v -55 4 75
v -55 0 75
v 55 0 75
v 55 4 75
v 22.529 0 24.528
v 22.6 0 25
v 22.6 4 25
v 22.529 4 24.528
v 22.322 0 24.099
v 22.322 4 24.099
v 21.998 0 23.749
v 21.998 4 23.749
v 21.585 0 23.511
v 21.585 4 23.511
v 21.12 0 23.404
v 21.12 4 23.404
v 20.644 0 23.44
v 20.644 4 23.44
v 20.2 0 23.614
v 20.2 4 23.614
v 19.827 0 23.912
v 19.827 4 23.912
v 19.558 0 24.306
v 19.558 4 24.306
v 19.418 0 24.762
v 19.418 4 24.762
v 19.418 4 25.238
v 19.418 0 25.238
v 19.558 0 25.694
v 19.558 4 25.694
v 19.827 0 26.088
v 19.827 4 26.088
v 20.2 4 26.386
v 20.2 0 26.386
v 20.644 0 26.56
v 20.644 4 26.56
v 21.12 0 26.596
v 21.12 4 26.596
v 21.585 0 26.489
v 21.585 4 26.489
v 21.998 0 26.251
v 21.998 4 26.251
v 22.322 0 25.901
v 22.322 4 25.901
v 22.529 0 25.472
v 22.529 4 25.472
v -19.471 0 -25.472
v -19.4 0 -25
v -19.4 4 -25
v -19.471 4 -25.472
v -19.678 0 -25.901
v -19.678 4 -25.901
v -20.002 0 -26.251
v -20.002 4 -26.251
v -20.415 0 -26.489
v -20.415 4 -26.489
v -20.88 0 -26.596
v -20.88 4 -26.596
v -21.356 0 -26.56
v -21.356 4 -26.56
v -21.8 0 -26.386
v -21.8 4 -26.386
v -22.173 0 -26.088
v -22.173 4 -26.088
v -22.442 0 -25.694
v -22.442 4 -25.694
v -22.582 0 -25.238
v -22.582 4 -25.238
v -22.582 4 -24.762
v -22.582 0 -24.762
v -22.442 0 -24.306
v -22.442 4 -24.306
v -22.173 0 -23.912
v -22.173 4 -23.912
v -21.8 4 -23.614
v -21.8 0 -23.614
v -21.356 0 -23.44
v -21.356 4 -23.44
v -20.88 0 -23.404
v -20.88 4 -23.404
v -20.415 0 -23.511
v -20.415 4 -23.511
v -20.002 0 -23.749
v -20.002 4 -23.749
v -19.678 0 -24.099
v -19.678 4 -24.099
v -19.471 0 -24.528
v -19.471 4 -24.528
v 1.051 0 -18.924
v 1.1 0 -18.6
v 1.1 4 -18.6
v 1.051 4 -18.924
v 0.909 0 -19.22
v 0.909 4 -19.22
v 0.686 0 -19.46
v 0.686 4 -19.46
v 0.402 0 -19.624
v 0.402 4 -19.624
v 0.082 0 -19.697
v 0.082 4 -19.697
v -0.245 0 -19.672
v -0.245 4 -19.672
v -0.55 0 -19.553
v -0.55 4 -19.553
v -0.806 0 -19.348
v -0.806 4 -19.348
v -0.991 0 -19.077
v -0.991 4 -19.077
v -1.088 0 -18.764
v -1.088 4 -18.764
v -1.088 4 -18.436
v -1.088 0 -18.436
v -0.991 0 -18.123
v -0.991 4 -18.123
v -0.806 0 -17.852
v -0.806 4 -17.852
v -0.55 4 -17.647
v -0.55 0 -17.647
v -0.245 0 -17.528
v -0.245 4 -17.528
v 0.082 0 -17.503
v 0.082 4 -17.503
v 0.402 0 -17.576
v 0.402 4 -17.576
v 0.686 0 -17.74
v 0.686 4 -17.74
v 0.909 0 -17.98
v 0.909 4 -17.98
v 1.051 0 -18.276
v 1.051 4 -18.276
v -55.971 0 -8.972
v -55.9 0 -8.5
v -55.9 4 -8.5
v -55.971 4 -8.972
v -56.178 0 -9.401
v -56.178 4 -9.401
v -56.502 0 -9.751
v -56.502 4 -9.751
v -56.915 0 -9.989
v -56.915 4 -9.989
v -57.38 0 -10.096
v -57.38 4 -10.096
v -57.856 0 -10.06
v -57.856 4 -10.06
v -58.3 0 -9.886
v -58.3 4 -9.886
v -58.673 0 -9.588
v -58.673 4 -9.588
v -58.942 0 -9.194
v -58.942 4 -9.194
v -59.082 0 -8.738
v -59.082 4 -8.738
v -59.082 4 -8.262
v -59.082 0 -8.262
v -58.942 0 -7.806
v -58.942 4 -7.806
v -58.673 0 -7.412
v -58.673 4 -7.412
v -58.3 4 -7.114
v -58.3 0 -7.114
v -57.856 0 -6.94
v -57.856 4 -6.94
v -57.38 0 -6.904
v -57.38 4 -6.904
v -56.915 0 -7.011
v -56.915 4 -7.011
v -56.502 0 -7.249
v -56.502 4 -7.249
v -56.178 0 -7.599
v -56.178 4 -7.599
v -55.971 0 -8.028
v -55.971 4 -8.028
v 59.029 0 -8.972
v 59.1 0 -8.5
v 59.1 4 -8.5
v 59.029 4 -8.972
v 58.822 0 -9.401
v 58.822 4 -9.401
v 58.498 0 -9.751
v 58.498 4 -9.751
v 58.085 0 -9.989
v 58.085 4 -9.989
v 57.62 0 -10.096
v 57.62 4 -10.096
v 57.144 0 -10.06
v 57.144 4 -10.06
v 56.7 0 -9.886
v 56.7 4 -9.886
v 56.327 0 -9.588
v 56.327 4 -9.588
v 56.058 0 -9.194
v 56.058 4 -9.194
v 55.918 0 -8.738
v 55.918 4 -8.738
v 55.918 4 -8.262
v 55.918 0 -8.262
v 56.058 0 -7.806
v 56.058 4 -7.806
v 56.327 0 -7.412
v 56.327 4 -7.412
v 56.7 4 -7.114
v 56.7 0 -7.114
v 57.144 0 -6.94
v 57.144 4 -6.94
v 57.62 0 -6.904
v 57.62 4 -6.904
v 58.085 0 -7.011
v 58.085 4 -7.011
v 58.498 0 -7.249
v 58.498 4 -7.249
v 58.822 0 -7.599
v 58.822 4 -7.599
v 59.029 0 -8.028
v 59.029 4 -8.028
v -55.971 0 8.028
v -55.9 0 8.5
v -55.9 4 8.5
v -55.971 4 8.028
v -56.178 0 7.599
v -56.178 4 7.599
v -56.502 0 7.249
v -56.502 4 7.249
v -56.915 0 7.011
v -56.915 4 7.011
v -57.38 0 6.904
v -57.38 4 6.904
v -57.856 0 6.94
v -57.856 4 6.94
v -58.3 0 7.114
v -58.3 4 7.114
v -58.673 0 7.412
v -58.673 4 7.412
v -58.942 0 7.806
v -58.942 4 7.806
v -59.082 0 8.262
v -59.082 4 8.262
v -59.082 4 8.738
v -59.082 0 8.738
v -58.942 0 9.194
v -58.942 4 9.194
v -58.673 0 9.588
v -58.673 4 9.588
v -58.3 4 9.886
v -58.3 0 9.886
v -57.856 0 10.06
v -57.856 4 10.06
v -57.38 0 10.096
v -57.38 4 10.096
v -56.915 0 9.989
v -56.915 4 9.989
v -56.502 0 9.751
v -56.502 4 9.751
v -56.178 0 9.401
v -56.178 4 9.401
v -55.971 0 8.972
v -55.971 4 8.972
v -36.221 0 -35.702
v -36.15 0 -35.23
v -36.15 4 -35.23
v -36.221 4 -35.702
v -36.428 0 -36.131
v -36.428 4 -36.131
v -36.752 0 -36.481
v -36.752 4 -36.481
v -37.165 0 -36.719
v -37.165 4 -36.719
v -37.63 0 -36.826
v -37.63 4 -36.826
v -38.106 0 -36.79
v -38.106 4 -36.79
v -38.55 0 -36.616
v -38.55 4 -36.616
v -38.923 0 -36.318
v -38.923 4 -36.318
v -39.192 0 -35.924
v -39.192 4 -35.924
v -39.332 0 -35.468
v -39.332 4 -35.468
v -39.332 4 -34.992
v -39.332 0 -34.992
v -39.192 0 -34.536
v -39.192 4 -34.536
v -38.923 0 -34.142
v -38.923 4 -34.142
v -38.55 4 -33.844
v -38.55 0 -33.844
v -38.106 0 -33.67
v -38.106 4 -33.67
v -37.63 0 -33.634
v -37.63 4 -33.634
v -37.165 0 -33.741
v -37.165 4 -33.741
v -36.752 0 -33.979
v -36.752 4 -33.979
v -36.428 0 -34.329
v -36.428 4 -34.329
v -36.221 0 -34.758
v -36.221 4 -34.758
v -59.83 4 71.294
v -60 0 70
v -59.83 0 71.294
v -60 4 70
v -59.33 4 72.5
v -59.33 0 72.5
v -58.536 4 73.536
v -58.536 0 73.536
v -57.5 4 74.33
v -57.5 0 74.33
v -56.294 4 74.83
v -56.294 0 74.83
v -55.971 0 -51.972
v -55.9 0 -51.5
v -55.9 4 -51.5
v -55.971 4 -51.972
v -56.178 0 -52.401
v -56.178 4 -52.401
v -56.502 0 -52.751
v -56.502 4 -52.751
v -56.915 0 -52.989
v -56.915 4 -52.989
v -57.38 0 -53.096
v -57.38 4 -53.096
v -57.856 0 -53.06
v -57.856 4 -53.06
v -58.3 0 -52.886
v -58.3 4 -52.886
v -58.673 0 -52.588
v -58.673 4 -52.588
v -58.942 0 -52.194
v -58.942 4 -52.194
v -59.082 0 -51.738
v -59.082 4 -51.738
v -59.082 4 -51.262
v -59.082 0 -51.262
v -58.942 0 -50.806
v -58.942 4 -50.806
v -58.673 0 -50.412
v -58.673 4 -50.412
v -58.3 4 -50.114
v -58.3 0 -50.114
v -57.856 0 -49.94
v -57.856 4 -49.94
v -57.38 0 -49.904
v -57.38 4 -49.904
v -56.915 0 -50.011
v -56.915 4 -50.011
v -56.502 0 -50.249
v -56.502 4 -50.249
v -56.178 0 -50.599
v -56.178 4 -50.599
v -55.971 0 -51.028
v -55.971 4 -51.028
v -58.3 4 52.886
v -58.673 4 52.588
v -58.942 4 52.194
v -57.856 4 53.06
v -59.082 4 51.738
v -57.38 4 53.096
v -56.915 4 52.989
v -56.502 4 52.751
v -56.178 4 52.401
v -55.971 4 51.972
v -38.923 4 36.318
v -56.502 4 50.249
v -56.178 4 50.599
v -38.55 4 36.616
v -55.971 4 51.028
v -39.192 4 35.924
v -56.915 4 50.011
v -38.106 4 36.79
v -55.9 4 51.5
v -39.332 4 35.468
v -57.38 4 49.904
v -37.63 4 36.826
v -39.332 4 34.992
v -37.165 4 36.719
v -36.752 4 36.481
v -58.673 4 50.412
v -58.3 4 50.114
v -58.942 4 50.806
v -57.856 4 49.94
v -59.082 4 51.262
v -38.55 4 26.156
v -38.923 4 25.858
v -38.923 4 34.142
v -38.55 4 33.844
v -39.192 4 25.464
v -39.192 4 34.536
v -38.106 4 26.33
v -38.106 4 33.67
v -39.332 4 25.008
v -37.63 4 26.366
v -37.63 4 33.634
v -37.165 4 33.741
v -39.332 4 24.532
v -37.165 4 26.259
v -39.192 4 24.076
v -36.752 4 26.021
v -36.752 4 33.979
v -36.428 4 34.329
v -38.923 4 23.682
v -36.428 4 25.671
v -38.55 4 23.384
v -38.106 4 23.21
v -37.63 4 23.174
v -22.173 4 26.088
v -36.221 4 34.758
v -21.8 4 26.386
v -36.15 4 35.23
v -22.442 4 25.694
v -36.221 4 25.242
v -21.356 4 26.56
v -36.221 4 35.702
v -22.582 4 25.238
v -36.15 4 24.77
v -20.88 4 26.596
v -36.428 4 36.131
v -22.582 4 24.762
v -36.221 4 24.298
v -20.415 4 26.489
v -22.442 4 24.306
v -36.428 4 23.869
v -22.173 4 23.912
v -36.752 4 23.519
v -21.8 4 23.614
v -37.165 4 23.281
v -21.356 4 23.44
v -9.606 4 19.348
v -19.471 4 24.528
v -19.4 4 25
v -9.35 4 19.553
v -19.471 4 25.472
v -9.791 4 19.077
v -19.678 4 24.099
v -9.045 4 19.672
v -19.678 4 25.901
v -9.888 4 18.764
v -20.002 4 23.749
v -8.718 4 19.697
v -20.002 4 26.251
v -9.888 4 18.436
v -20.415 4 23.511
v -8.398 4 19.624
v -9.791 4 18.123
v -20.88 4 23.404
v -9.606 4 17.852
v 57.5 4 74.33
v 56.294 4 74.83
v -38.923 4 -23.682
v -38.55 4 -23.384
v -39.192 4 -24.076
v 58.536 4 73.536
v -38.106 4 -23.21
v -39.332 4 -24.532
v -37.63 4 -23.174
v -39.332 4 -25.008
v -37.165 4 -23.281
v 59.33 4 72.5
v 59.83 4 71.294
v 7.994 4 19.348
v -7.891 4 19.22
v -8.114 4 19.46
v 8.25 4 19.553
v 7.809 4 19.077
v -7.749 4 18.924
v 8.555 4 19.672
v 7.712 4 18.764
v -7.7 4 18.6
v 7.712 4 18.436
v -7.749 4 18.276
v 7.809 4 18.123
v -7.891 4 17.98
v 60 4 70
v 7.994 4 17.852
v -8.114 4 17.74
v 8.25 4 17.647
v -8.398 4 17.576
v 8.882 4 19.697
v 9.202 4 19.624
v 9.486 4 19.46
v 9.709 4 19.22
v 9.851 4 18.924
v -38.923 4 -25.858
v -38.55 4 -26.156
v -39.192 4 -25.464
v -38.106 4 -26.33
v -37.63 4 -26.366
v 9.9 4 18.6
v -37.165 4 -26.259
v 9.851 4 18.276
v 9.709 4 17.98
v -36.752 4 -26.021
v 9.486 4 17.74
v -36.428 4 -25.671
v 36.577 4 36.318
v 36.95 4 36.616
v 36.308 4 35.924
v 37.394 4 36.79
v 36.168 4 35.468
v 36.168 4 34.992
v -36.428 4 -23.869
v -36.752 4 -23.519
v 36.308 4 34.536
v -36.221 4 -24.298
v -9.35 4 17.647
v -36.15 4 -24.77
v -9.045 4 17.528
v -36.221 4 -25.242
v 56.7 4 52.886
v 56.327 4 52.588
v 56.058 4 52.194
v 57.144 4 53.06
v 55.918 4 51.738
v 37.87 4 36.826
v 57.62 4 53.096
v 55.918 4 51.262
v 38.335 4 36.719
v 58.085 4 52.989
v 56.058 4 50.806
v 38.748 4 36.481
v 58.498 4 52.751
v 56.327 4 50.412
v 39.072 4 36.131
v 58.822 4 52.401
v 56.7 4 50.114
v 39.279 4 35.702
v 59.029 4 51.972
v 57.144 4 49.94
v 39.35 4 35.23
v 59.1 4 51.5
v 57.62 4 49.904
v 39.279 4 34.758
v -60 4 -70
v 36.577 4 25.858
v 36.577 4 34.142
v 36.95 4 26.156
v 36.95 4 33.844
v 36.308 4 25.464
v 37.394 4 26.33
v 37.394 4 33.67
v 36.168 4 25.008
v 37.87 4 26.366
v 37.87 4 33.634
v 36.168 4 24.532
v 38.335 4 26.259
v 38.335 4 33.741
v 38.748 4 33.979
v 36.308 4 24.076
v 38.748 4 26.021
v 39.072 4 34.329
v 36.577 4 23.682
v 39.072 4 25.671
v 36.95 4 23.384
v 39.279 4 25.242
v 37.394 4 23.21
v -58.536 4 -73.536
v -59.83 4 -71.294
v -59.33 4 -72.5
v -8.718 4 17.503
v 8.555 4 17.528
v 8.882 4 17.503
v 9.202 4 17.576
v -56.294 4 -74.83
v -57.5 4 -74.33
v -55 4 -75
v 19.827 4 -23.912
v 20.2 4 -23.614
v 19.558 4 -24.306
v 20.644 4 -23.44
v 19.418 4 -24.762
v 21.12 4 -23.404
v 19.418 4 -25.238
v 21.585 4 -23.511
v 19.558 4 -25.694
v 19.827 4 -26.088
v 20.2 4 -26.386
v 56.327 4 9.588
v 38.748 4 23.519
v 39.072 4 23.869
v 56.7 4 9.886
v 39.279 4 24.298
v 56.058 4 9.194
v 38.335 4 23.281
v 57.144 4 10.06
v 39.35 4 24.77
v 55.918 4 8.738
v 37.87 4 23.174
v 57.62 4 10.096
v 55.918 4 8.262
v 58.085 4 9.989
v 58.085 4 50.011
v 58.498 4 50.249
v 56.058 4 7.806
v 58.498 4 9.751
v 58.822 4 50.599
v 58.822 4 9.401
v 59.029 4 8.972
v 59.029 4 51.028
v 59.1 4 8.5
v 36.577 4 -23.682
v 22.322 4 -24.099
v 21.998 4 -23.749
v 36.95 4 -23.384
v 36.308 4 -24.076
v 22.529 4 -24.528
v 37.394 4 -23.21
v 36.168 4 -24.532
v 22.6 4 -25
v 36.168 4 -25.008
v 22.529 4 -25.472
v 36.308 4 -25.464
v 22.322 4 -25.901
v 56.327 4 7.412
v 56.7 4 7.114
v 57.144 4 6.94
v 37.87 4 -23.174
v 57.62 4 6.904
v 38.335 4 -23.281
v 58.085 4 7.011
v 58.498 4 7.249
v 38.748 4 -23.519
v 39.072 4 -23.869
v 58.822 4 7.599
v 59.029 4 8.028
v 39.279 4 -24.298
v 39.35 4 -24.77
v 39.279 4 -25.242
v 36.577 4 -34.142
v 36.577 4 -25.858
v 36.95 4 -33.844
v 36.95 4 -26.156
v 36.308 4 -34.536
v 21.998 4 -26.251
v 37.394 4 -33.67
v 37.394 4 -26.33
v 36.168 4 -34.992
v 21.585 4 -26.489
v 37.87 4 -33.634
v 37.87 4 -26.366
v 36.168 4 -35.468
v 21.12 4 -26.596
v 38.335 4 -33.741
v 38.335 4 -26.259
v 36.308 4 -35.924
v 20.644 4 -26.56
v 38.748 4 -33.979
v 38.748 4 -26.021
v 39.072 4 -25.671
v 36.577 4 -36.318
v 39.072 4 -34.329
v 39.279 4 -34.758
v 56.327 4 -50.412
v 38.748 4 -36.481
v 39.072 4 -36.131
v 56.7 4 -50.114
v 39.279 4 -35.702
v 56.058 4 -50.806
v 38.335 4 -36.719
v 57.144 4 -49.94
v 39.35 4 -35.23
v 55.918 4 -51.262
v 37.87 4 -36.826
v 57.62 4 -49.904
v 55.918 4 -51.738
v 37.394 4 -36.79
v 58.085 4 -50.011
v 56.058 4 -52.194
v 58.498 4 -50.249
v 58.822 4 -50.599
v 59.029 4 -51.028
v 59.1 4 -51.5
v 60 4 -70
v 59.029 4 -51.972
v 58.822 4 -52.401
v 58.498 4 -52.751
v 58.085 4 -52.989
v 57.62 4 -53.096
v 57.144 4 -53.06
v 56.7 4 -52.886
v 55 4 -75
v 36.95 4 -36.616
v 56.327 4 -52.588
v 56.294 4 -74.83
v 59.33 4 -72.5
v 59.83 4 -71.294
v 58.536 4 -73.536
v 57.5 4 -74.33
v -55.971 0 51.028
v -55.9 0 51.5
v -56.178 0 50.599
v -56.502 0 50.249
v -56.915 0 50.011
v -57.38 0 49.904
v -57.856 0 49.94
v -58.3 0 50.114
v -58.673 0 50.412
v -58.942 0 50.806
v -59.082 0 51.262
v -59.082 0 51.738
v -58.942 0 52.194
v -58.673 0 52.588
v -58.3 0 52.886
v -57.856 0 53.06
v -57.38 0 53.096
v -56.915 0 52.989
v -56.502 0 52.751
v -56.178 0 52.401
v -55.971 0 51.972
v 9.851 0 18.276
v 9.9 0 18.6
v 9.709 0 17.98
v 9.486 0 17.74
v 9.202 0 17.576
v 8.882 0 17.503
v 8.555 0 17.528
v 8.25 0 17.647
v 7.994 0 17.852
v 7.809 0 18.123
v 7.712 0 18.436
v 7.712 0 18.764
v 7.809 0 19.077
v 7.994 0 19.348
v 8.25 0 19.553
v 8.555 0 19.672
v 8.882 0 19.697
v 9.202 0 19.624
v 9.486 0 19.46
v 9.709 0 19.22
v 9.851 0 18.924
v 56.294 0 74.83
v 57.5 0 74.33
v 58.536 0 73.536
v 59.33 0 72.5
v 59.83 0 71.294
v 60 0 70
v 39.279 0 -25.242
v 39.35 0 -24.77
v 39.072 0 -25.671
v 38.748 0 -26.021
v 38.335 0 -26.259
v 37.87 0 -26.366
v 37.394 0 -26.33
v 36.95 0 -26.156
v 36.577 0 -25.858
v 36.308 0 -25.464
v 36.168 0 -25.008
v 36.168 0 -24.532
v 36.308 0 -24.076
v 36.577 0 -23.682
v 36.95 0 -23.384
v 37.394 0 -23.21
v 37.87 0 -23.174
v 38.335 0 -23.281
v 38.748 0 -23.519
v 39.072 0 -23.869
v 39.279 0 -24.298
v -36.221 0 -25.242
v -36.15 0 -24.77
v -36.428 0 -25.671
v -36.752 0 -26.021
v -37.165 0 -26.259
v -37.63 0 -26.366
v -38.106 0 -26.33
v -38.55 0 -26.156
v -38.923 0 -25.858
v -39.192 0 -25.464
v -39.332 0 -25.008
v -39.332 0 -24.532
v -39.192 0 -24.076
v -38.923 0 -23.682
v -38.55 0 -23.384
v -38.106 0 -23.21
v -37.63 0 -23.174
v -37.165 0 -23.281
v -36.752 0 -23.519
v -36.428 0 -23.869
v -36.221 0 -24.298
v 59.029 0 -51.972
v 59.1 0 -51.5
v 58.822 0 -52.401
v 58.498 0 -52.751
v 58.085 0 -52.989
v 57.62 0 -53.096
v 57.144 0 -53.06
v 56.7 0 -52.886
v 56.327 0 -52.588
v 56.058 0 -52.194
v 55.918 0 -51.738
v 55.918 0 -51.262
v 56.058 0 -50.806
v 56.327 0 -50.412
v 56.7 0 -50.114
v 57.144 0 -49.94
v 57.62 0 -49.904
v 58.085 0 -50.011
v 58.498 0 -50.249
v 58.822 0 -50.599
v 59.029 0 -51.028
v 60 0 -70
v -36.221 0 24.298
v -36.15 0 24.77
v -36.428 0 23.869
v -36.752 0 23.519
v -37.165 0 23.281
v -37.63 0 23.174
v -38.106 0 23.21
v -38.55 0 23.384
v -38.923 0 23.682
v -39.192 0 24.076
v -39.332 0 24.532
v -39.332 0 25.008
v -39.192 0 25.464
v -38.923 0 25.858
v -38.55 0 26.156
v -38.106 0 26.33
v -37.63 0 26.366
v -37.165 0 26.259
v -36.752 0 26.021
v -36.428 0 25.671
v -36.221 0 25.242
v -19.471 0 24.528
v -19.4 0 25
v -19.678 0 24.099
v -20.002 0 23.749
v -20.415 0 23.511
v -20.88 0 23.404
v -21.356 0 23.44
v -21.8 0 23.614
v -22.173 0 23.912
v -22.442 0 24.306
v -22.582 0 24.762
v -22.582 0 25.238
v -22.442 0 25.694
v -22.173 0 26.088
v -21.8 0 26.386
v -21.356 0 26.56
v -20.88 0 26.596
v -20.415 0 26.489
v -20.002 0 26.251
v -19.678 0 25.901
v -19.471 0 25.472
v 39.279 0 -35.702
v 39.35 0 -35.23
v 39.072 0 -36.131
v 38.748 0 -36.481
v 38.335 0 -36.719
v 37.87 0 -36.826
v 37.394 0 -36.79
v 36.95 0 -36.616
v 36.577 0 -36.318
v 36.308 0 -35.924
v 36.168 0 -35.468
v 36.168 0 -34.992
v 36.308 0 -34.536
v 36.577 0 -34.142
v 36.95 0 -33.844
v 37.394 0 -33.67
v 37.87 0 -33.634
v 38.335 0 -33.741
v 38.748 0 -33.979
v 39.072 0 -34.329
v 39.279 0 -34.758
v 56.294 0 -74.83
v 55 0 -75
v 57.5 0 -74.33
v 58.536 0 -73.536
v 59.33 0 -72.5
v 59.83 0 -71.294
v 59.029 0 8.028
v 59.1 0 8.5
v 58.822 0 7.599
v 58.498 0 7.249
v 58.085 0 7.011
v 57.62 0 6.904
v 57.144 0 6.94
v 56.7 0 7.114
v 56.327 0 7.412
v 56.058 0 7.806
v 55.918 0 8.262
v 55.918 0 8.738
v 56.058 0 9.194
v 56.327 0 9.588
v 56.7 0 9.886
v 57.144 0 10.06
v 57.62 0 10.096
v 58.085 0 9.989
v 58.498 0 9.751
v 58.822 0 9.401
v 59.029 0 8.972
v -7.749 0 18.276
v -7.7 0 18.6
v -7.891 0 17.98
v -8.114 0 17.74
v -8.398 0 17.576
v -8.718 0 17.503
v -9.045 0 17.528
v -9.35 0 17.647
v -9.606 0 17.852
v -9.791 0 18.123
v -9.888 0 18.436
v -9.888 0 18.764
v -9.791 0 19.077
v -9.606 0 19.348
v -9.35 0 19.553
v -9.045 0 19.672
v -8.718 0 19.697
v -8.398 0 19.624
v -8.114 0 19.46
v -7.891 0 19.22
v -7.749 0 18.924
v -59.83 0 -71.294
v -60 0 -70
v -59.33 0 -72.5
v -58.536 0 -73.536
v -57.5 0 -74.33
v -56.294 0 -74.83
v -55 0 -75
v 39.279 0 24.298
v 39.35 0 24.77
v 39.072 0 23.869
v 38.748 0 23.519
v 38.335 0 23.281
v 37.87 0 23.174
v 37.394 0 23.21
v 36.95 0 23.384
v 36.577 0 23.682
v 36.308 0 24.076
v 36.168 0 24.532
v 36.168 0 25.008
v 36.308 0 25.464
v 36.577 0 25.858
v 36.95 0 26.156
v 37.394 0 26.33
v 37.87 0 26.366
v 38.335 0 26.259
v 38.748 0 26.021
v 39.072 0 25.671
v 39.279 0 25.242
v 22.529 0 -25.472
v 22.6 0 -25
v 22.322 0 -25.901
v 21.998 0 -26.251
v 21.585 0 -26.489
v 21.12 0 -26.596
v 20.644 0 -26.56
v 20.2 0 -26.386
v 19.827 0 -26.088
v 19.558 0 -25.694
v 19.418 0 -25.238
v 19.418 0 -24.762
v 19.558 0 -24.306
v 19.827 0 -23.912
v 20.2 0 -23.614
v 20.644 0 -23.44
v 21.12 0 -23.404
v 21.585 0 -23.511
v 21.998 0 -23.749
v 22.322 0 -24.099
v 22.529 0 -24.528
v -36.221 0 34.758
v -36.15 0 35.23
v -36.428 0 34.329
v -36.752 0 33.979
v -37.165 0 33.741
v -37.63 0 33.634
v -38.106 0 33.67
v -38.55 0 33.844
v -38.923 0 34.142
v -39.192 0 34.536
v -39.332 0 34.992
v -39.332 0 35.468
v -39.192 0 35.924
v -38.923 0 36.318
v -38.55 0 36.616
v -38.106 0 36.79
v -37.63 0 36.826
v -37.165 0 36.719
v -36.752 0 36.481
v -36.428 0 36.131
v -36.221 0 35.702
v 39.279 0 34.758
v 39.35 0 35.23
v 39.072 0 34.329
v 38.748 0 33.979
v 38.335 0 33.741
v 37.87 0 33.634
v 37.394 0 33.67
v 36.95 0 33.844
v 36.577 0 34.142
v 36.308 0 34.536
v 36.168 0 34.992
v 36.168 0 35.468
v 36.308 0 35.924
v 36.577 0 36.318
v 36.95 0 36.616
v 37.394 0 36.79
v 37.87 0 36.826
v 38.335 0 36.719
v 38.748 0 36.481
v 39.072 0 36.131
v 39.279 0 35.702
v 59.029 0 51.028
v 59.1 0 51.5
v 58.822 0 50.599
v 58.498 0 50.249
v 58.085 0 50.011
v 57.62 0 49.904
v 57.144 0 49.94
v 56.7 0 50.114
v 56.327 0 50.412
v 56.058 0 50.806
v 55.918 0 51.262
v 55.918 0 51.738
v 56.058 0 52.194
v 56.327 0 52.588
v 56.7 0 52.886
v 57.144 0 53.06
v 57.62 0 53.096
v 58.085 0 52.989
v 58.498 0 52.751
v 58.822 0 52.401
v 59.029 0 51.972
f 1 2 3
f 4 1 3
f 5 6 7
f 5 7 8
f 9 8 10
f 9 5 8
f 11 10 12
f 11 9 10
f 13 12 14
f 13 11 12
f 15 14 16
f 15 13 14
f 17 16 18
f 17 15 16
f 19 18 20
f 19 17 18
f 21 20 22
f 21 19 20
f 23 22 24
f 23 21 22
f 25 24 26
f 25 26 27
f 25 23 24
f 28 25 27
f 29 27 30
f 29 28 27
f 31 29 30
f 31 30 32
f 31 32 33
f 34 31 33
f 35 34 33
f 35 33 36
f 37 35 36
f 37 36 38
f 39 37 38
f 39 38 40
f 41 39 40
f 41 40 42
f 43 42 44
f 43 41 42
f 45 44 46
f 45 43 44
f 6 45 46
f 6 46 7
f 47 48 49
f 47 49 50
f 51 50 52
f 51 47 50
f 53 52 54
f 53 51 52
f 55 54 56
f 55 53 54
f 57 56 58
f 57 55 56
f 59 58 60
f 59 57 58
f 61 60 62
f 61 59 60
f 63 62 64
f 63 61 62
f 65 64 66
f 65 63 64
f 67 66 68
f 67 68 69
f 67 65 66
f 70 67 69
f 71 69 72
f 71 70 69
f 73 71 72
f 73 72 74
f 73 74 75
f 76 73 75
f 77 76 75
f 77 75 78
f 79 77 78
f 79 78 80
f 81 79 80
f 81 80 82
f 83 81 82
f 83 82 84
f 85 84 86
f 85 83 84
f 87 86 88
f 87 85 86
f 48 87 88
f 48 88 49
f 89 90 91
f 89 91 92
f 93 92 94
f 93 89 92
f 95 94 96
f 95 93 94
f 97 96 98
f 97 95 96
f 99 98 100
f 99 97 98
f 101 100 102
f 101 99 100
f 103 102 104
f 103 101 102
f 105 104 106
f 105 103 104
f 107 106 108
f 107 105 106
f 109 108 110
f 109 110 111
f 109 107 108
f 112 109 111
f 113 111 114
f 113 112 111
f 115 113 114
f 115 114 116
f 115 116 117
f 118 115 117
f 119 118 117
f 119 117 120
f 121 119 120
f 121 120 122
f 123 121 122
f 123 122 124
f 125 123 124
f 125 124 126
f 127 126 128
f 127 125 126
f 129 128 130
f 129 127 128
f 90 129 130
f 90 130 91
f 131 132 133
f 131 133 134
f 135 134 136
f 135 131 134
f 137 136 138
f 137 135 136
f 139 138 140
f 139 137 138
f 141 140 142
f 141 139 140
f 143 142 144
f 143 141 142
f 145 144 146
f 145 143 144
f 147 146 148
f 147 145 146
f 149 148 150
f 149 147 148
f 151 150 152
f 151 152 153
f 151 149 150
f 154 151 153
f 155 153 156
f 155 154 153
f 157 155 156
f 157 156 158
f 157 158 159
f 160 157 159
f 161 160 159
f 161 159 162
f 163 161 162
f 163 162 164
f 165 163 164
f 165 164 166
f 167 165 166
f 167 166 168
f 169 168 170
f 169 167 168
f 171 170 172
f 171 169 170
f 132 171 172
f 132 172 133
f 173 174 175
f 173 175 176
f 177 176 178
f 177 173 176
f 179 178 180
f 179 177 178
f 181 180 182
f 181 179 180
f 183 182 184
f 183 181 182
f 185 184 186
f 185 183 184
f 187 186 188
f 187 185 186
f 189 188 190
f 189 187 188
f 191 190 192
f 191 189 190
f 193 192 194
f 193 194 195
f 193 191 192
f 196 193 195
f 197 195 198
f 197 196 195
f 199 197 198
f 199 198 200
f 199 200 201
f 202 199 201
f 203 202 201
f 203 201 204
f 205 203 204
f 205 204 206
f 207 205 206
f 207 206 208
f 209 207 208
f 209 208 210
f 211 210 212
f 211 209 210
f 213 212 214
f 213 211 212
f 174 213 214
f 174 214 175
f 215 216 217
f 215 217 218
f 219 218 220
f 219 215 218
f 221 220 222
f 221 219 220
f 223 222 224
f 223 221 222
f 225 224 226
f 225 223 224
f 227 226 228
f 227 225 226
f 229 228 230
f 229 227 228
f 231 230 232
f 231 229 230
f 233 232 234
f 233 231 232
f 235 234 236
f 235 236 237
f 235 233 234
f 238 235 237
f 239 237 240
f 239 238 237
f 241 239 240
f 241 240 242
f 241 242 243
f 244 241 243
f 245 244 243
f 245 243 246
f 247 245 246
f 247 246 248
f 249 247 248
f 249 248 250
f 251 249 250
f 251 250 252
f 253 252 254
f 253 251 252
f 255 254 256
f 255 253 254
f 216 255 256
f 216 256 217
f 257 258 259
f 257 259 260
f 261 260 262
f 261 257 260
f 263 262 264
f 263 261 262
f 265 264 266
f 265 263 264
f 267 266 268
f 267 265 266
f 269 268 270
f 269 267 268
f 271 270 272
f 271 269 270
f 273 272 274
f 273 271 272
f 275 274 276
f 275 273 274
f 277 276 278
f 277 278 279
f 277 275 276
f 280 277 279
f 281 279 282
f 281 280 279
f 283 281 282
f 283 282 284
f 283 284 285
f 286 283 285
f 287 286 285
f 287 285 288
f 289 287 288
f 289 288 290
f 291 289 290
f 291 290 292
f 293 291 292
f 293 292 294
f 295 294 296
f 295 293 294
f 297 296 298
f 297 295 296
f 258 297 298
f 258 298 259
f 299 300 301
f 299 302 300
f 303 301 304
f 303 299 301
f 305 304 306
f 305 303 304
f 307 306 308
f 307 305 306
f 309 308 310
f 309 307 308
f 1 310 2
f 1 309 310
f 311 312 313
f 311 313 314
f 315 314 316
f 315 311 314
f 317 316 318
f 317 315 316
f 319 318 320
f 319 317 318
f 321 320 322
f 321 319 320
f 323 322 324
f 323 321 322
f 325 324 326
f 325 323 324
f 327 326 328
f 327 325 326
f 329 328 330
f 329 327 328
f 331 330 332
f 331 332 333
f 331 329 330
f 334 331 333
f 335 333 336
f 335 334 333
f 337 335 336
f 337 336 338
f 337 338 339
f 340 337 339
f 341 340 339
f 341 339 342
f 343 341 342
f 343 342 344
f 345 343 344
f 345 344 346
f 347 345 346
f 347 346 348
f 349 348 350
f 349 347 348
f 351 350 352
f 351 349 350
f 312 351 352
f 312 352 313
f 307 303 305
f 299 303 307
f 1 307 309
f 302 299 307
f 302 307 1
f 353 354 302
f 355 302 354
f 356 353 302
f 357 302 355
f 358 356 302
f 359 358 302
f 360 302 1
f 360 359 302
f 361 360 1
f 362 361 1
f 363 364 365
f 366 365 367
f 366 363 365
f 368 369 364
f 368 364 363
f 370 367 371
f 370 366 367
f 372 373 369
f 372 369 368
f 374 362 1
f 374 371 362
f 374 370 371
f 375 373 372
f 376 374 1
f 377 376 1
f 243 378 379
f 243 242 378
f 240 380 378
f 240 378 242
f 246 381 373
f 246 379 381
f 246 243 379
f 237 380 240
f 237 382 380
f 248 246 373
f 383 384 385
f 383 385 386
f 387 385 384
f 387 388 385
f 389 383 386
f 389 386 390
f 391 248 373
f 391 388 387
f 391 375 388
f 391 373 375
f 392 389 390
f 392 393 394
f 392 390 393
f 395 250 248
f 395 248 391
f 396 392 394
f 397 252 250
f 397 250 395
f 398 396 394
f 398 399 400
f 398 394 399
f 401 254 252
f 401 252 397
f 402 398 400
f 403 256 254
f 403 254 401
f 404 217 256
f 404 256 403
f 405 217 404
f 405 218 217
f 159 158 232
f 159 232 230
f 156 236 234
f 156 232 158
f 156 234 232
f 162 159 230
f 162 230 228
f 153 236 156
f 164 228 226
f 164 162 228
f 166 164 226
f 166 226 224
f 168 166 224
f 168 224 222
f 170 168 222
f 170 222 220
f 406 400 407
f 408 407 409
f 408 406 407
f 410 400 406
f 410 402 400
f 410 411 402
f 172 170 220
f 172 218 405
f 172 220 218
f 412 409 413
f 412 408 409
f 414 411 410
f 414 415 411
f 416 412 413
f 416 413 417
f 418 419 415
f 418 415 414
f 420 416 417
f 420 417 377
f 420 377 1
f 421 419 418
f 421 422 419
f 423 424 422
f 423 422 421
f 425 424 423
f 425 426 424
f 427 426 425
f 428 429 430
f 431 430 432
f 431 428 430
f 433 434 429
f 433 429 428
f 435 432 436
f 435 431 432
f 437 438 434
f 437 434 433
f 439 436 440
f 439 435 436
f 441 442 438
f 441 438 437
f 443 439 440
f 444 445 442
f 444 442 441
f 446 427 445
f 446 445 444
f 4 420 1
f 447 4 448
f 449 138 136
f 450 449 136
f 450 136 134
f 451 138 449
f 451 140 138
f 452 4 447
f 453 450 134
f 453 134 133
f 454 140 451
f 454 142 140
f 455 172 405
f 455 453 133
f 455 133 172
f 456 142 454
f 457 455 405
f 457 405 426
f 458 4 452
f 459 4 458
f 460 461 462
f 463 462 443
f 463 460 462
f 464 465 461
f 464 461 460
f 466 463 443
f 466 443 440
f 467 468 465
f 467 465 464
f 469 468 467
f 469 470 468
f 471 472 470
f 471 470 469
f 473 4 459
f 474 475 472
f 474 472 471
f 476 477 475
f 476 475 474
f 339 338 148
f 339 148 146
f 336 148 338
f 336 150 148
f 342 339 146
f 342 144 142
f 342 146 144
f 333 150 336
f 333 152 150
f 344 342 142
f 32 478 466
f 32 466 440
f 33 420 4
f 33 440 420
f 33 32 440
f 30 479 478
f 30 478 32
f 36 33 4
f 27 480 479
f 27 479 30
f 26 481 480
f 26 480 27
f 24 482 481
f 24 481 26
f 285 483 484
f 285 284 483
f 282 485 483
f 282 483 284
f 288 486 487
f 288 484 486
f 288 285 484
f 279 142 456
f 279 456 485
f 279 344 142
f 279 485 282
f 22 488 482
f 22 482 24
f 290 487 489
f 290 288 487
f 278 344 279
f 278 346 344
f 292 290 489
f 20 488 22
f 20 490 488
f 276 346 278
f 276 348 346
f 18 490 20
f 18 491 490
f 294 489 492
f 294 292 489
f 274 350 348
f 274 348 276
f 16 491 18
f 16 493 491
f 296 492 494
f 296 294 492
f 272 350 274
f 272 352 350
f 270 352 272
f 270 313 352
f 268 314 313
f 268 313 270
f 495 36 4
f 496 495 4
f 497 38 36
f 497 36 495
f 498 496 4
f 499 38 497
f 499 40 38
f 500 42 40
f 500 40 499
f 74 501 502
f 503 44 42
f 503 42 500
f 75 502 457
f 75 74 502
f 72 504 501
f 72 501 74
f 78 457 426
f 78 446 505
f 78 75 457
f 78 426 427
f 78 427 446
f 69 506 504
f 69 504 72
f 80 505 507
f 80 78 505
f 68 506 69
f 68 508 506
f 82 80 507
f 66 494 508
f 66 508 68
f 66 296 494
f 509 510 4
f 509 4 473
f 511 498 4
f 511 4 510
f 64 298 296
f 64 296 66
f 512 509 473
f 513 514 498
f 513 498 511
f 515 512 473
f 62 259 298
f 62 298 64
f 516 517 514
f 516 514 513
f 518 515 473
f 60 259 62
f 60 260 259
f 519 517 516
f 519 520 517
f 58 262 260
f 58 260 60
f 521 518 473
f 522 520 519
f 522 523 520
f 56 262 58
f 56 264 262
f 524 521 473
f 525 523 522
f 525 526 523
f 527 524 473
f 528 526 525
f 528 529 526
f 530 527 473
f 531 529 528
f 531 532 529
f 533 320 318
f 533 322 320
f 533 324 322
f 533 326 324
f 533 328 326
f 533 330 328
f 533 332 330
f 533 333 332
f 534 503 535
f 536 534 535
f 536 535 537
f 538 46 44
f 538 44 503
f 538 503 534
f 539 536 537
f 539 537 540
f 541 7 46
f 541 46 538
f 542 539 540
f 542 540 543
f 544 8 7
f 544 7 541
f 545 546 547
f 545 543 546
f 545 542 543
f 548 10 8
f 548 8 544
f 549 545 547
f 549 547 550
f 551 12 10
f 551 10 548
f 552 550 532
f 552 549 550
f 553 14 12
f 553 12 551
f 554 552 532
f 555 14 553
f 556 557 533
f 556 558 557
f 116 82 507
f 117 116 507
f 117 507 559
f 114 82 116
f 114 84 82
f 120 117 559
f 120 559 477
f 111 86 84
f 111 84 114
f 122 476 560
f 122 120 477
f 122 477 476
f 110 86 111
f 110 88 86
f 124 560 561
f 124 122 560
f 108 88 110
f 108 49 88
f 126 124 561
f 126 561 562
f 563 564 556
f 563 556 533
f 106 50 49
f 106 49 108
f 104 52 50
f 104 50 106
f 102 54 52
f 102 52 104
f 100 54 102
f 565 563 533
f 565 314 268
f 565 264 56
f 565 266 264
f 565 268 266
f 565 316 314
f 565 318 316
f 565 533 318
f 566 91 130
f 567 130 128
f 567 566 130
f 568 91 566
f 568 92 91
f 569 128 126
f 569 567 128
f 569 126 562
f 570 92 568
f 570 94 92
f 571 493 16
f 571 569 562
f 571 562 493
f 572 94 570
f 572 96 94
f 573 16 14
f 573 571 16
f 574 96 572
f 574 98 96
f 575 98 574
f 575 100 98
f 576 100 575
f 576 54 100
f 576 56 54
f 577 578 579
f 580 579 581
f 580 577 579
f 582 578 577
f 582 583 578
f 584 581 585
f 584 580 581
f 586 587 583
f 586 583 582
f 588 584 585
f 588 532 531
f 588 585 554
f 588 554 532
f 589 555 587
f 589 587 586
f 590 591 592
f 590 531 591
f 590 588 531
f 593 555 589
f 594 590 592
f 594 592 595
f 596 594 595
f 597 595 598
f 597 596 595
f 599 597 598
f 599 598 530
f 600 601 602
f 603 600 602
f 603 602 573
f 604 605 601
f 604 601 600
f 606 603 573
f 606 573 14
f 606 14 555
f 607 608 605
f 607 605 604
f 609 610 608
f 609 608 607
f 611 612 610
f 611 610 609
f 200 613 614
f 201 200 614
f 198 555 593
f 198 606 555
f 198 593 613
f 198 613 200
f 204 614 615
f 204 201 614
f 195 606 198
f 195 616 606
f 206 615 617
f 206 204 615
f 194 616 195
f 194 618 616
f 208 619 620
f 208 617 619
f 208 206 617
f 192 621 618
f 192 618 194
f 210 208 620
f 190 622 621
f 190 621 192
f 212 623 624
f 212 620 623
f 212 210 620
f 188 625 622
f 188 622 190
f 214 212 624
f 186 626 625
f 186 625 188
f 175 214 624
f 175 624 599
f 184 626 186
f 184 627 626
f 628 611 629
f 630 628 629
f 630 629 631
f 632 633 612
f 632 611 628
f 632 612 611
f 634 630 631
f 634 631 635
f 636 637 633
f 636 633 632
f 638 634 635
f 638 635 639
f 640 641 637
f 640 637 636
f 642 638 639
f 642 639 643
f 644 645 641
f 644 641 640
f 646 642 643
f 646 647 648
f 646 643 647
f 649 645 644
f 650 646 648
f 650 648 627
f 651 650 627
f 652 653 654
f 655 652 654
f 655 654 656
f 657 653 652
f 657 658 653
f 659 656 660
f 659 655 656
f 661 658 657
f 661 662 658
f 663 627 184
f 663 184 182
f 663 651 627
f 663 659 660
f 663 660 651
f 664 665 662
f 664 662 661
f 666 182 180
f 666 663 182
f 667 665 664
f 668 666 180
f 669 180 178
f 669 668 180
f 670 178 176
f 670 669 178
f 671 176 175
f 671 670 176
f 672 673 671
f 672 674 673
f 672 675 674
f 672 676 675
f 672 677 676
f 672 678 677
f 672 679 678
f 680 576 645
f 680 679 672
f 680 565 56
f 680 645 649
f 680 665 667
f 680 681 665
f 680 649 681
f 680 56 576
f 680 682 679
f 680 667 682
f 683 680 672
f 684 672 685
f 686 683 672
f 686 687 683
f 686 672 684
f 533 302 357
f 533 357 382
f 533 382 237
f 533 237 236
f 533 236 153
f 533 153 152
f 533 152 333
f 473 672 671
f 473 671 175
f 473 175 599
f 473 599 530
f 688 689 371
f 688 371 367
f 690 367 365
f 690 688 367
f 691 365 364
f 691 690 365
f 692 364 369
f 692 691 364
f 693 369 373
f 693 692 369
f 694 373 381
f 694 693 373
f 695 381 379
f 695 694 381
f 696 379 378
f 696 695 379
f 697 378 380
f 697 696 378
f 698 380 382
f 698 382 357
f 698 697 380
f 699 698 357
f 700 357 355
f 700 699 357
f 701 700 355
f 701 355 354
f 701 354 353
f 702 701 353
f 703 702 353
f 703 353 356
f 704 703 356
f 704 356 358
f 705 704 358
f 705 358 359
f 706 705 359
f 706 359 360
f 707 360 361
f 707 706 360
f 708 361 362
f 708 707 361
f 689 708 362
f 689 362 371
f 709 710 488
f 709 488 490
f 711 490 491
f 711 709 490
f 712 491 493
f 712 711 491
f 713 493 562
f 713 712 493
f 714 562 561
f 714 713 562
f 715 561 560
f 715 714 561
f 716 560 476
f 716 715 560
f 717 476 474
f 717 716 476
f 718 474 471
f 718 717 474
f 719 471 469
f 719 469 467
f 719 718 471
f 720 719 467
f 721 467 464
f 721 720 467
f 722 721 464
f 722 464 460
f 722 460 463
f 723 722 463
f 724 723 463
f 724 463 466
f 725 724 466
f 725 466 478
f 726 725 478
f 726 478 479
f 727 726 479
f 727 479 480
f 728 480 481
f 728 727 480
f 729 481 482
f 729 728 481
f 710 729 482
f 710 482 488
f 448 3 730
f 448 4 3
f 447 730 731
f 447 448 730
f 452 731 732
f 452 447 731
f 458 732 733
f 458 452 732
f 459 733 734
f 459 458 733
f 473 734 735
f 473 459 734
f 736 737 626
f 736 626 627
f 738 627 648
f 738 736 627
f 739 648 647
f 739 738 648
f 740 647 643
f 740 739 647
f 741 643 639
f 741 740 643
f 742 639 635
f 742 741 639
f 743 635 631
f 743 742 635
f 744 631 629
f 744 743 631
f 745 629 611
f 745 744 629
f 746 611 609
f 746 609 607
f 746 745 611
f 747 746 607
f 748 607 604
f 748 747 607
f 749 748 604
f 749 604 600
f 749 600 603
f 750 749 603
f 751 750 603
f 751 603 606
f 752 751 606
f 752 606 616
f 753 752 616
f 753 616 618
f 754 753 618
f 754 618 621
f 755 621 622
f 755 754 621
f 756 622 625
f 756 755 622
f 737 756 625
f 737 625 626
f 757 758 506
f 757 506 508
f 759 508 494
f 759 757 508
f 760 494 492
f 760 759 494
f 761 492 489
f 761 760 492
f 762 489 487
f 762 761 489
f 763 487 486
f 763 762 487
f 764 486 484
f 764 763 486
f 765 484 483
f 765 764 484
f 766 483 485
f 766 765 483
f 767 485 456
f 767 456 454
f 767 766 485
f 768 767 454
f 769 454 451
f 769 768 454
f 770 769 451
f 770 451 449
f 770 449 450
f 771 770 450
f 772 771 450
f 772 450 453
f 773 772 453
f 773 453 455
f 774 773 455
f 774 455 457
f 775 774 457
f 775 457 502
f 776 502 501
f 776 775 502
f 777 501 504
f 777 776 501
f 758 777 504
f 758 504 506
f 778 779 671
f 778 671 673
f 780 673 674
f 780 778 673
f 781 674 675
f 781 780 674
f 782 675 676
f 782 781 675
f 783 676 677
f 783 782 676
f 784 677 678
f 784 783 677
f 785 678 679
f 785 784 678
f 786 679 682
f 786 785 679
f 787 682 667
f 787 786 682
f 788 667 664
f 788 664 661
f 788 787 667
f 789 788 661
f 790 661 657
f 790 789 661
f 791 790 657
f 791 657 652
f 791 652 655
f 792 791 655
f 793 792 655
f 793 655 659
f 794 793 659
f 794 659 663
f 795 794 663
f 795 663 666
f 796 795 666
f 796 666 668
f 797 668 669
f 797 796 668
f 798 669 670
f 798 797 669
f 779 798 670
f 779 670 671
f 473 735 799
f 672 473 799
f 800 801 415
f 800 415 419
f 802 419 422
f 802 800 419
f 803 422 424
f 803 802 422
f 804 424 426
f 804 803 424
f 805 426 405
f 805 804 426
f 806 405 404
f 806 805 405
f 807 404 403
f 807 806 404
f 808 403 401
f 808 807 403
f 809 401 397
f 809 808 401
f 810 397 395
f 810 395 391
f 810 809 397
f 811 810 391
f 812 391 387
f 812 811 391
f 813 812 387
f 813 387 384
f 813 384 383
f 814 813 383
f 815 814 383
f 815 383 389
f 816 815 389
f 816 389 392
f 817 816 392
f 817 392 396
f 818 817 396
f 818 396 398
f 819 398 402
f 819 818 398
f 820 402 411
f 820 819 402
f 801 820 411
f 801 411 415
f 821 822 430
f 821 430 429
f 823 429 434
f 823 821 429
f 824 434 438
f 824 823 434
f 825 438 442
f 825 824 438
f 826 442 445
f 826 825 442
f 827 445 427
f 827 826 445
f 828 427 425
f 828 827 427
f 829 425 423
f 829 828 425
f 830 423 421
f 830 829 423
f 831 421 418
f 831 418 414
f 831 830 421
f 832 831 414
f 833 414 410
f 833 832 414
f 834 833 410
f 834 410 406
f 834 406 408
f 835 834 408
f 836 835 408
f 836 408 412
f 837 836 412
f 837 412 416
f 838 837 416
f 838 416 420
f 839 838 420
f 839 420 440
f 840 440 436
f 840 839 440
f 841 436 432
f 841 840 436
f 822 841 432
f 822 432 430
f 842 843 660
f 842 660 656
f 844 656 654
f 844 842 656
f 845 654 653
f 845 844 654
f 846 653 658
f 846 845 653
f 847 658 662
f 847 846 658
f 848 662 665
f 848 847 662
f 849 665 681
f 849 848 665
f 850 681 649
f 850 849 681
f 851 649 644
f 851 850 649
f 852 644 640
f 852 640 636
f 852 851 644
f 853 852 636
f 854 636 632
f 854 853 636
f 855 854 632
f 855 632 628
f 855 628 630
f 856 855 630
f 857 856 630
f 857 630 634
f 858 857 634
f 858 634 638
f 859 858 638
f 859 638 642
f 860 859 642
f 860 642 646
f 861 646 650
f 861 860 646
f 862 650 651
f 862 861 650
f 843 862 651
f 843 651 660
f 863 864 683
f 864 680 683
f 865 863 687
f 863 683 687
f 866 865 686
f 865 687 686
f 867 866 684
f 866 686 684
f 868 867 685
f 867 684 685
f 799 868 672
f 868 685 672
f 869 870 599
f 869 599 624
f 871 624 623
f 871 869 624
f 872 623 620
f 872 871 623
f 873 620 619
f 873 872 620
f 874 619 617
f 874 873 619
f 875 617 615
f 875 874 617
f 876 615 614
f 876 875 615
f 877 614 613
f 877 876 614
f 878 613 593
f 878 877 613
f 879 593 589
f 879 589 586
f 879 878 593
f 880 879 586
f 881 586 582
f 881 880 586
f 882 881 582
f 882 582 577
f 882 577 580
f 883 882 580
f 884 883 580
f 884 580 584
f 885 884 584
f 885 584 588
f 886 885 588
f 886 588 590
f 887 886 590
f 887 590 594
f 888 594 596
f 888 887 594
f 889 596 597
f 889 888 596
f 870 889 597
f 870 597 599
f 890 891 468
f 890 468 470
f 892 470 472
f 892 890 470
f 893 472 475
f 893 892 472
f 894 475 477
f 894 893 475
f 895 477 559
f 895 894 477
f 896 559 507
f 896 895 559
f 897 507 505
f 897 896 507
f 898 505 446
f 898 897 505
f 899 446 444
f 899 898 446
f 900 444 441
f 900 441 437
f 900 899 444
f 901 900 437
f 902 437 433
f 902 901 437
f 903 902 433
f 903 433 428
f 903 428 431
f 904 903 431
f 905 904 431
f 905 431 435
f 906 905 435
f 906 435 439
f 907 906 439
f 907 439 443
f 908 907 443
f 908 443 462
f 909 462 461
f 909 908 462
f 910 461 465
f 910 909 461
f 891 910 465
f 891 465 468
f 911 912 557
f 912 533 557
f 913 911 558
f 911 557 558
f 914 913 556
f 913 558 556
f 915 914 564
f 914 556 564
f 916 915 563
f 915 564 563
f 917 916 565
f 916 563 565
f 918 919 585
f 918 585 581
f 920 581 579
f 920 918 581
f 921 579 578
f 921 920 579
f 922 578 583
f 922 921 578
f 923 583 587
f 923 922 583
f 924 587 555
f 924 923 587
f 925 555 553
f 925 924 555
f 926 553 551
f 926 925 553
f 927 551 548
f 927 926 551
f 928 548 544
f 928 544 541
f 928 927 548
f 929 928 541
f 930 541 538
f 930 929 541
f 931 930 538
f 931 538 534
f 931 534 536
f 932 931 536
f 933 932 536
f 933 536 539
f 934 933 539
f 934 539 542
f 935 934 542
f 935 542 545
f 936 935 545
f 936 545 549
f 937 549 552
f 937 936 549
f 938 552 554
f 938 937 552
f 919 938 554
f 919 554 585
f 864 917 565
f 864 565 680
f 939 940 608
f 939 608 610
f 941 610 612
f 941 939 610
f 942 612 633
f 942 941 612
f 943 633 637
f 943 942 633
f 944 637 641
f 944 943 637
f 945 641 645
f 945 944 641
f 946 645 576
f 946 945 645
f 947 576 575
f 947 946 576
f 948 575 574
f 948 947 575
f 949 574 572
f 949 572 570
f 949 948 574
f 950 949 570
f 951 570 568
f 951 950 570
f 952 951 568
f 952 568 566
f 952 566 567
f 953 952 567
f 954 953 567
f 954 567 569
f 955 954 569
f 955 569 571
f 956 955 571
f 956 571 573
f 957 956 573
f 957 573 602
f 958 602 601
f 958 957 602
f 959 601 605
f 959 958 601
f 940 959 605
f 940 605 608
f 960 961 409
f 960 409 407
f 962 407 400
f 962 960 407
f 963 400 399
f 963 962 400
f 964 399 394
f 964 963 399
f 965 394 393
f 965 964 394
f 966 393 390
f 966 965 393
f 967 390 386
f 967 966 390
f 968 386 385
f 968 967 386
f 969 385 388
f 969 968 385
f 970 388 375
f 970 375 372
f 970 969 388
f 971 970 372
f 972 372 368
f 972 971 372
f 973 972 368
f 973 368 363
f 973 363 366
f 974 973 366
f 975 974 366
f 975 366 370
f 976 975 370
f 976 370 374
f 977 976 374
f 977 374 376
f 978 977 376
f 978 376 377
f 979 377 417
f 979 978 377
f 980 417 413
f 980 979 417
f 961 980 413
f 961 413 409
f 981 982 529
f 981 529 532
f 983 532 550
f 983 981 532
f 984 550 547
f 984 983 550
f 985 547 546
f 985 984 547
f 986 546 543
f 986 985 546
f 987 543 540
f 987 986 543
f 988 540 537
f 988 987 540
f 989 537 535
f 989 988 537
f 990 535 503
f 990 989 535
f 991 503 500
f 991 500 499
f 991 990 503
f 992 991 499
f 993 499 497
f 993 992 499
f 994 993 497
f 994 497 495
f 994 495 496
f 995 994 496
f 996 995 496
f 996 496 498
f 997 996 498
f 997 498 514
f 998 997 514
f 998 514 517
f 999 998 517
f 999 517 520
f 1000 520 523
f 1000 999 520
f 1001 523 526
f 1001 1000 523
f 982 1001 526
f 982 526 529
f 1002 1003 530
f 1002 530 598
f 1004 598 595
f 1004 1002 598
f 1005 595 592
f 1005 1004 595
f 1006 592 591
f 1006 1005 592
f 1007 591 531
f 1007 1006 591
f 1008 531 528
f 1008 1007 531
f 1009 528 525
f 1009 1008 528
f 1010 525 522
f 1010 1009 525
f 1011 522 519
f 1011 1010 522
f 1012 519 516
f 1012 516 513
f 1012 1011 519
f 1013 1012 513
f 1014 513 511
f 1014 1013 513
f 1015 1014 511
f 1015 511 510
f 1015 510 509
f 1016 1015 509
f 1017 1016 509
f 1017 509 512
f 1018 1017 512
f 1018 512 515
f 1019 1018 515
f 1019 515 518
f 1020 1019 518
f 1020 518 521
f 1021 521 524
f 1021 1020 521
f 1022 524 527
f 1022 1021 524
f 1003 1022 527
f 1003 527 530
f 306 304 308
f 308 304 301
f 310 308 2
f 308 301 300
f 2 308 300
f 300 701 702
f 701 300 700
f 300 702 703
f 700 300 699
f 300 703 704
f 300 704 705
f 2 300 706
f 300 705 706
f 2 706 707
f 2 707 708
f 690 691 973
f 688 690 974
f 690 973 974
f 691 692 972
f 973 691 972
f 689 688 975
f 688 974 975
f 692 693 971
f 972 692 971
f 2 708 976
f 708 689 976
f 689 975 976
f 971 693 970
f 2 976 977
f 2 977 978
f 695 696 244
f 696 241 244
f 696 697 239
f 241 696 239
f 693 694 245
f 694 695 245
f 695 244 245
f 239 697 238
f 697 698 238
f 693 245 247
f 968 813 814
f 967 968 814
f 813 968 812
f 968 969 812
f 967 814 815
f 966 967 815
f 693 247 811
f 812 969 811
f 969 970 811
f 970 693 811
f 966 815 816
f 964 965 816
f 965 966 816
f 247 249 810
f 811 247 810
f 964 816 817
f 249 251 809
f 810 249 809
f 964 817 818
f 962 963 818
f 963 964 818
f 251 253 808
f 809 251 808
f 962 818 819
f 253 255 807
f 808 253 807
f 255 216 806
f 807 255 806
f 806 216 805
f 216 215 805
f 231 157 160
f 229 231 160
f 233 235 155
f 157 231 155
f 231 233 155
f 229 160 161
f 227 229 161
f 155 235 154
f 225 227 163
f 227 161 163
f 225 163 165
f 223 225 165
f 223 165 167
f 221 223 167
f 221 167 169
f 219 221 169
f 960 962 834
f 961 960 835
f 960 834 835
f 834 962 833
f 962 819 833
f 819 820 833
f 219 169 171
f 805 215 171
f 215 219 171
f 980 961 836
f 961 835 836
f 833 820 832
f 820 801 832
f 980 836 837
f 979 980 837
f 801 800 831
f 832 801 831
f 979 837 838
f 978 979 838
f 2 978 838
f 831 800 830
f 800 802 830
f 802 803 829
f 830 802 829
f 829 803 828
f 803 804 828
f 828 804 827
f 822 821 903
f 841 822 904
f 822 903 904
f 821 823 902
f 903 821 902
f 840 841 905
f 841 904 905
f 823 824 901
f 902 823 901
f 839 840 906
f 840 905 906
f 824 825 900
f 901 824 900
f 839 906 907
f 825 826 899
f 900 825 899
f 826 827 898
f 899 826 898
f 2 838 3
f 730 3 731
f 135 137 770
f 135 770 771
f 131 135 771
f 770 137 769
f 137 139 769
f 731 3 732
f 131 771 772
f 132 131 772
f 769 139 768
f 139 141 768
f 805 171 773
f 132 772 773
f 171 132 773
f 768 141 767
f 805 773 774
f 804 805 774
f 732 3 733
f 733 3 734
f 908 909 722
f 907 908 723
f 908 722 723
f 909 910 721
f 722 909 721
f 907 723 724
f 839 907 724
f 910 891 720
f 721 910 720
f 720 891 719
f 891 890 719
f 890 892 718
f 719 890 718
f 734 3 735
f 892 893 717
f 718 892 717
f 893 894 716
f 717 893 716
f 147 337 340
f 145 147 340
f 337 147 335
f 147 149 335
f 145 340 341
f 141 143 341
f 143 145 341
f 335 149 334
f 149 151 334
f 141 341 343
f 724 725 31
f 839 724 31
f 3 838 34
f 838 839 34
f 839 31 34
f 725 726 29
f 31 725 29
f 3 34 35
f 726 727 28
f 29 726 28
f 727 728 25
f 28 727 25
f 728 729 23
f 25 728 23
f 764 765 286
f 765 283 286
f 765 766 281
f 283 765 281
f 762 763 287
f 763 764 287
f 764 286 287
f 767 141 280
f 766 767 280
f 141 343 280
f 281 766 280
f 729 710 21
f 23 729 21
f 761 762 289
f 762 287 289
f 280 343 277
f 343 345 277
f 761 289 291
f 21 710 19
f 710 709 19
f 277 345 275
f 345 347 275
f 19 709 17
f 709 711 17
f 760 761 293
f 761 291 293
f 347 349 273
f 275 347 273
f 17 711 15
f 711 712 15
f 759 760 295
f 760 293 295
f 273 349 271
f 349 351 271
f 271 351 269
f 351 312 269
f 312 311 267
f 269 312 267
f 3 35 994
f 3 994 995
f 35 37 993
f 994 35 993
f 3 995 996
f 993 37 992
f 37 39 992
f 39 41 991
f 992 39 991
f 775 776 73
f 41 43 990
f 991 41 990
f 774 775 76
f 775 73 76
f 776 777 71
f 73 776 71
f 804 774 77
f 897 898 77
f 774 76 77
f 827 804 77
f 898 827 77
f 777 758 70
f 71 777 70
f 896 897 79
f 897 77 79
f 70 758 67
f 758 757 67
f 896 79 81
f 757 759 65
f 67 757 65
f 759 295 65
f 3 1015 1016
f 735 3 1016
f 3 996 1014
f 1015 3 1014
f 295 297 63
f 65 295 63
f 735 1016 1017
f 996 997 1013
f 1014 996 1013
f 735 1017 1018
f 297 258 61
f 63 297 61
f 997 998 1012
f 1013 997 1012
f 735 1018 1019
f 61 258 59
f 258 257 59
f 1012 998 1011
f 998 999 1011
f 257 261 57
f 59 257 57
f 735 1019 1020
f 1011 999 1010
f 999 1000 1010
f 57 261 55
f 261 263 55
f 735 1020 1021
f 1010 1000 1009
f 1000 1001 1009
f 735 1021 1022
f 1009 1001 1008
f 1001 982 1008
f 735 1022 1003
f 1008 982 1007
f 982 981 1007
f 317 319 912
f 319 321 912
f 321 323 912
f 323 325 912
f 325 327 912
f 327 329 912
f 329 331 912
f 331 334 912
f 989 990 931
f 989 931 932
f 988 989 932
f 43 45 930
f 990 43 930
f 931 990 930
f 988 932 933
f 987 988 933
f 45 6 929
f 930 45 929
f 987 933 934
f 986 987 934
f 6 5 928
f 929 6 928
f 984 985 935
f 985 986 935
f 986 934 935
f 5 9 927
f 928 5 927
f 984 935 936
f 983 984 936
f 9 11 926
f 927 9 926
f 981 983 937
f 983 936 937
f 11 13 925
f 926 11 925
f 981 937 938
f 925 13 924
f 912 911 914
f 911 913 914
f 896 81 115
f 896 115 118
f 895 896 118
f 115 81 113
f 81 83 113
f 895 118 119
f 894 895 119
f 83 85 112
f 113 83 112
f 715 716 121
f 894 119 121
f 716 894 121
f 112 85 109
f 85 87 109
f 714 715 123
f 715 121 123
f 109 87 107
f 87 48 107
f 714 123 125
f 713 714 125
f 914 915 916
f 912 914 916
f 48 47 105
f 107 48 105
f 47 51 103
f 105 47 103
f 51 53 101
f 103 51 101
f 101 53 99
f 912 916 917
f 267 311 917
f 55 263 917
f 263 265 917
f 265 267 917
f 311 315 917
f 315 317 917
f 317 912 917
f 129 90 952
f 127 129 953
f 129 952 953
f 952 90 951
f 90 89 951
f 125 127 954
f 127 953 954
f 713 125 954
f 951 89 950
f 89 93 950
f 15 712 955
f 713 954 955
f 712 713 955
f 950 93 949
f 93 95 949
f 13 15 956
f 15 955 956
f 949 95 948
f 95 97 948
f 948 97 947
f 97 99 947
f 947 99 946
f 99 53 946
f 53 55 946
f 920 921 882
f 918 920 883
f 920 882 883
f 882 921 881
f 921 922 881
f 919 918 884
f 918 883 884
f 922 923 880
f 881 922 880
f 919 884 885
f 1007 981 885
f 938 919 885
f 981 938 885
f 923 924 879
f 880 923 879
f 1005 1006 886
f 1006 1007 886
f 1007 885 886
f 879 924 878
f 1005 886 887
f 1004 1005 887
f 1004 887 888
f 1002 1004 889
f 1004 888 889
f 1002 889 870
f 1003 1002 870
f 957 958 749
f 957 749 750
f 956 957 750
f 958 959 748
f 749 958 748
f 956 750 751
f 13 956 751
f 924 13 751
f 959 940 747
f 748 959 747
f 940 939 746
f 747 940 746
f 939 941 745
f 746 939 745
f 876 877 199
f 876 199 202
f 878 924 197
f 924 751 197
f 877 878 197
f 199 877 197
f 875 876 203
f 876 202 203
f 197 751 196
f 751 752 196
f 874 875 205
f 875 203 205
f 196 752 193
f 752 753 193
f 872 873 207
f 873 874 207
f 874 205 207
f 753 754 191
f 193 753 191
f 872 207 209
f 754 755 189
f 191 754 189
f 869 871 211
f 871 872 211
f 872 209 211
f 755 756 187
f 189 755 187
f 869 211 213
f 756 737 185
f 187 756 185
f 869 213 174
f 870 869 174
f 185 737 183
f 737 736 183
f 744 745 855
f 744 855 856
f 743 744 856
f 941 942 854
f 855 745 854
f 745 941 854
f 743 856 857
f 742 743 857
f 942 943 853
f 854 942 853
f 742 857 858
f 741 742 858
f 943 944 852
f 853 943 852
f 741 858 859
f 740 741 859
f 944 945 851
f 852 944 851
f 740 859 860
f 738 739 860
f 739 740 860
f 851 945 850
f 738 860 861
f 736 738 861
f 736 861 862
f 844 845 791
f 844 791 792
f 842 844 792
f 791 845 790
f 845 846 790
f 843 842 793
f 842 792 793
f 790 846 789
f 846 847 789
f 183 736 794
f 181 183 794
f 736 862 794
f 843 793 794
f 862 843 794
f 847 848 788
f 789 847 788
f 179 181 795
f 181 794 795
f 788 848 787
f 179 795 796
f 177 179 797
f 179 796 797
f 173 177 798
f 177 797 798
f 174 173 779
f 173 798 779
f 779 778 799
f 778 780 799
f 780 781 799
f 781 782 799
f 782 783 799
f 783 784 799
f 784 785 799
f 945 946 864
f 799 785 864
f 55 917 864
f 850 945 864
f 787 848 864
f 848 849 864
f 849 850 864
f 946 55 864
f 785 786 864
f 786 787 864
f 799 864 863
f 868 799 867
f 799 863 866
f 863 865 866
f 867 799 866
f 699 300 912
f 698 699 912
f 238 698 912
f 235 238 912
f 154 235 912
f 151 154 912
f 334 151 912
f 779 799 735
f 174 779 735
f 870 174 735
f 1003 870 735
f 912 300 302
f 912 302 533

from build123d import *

# Parameters (mm, degrees)
SKETCH_1_W      = 120
SKETCH_1_H      = 150
SKETCH_1_R      = 1.6
SKETCH_1_R_2    = 1.1
EXTRUDE_1_DEPTH = 4
FILLET_1_R      = 5


with BuildPart() as part:
    # 草图1 → 凸台-拉伸1 (new body)
    with BuildSketch(Plane(origin=(0, 0, 0), x_dir=(1, 0, 0), z_dir=(0, 1, 0))):
        Rectangle(SKETCH_1_W, SKETCH_1_H)
        with Locations((-57.5, 51.5)):
            Circle(SKETCH_1_R, mode=Mode.SUBTRACT)
        with Locations((-57.5, 8.5)):
            Circle(SKETCH_1_R, mode=Mode.SUBTRACT)
        with Locations((-37.75, 35.23)):
            Circle(SKETCH_1_R, mode=Mode.SUBTRACT)
        with Locations((-37.75, 24.77)):
            Circle(SKETCH_1_R, mode=Mode.SUBTRACT)
        with Locations((-57.5, -8.5)):
            Circle(SKETCH_1_R, mode=Mode.SUBTRACT)
        with Locations((-37.75, -24.77)):
            Circle(SKETCH_1_R, mode=Mode.SUBTRACT)
        with Locations((-37.75, -35.23)):
            Circle(SKETCH_1_R, mode=Mode.SUBTRACT)
        with Locations((-57.5, -51.5)):
            Circle(SKETCH_1_R, mode=Mode.SUBTRACT)
        with Locations((57.5, -51.5)):
            Circle(SKETCH_1_R, mode=Mode.SUBTRACT)
        with Locations((37.75, -35.23)):
            Circle(SKETCH_1_R, mode=Mode.SUBTRACT)
        with Locations((37.75, -24.77)):
            Circle(SKETCH_1_R, mode=Mode.SUBTRACT)
        with Locations((57.5, -8.5)):
            Circle(SKETCH_1_R, mode=Mode.SUBTRACT)
        with Locations((57.5, 8.5)):
            Circle(SKETCH_1_R, mode=Mode.SUBTRACT)
        with Locations((37.75, 24.77)):
            Circle(SKETCH_1_R, mode=Mode.SUBTRACT)
        with Locations((37.75, 35.23)):
            Circle(SKETCH_1_R, mode=Mode.SUBTRACT)
        with Locations((57.5, 51.5)):
            Circle(SKETCH_1_R, mode=Mode.SUBTRACT)
        with Locations((0, 18.6)):
            Circle(SKETCH_1_R_2, mode=Mode.SUBTRACT)
        with Locations((8.8, -18.6)):
            Circle(SKETCH_1_R_2, mode=Mode.SUBTRACT)
        with Locations((-8.8, -18.6)):
            Circle(SKETCH_1_R_2, mode=Mode.SUBTRACT)
        with Locations((-21, 25)):
            Circle(SKETCH_1_R, mode=Mode.SUBTRACT)
        with Locations((21, 25)):
            Circle(SKETCH_1_R, mode=Mode.SUBTRACT)
        with Locations((21, -25)):
            Circle(SKETCH_1_R, mode=Mode.SUBTRACT)
        with Locations((-21, -25)):
            Circle(SKETCH_1_R, mode=Mode.SUBTRACT)
    extrude(amount=EXTRUDE_1_DEPTH)

    # 圆角1
    fillet_1_edges = [part.edges().sort_by_distance(p)[0] for p in [
        (60, 2, 75),
        (-60, 2, 75),
        (-60, 2, -75),
        (60, 2, -75),
    ]]
    fillet(fillet_1_edges, radius=FILLET_1_R)


solid = part.part
